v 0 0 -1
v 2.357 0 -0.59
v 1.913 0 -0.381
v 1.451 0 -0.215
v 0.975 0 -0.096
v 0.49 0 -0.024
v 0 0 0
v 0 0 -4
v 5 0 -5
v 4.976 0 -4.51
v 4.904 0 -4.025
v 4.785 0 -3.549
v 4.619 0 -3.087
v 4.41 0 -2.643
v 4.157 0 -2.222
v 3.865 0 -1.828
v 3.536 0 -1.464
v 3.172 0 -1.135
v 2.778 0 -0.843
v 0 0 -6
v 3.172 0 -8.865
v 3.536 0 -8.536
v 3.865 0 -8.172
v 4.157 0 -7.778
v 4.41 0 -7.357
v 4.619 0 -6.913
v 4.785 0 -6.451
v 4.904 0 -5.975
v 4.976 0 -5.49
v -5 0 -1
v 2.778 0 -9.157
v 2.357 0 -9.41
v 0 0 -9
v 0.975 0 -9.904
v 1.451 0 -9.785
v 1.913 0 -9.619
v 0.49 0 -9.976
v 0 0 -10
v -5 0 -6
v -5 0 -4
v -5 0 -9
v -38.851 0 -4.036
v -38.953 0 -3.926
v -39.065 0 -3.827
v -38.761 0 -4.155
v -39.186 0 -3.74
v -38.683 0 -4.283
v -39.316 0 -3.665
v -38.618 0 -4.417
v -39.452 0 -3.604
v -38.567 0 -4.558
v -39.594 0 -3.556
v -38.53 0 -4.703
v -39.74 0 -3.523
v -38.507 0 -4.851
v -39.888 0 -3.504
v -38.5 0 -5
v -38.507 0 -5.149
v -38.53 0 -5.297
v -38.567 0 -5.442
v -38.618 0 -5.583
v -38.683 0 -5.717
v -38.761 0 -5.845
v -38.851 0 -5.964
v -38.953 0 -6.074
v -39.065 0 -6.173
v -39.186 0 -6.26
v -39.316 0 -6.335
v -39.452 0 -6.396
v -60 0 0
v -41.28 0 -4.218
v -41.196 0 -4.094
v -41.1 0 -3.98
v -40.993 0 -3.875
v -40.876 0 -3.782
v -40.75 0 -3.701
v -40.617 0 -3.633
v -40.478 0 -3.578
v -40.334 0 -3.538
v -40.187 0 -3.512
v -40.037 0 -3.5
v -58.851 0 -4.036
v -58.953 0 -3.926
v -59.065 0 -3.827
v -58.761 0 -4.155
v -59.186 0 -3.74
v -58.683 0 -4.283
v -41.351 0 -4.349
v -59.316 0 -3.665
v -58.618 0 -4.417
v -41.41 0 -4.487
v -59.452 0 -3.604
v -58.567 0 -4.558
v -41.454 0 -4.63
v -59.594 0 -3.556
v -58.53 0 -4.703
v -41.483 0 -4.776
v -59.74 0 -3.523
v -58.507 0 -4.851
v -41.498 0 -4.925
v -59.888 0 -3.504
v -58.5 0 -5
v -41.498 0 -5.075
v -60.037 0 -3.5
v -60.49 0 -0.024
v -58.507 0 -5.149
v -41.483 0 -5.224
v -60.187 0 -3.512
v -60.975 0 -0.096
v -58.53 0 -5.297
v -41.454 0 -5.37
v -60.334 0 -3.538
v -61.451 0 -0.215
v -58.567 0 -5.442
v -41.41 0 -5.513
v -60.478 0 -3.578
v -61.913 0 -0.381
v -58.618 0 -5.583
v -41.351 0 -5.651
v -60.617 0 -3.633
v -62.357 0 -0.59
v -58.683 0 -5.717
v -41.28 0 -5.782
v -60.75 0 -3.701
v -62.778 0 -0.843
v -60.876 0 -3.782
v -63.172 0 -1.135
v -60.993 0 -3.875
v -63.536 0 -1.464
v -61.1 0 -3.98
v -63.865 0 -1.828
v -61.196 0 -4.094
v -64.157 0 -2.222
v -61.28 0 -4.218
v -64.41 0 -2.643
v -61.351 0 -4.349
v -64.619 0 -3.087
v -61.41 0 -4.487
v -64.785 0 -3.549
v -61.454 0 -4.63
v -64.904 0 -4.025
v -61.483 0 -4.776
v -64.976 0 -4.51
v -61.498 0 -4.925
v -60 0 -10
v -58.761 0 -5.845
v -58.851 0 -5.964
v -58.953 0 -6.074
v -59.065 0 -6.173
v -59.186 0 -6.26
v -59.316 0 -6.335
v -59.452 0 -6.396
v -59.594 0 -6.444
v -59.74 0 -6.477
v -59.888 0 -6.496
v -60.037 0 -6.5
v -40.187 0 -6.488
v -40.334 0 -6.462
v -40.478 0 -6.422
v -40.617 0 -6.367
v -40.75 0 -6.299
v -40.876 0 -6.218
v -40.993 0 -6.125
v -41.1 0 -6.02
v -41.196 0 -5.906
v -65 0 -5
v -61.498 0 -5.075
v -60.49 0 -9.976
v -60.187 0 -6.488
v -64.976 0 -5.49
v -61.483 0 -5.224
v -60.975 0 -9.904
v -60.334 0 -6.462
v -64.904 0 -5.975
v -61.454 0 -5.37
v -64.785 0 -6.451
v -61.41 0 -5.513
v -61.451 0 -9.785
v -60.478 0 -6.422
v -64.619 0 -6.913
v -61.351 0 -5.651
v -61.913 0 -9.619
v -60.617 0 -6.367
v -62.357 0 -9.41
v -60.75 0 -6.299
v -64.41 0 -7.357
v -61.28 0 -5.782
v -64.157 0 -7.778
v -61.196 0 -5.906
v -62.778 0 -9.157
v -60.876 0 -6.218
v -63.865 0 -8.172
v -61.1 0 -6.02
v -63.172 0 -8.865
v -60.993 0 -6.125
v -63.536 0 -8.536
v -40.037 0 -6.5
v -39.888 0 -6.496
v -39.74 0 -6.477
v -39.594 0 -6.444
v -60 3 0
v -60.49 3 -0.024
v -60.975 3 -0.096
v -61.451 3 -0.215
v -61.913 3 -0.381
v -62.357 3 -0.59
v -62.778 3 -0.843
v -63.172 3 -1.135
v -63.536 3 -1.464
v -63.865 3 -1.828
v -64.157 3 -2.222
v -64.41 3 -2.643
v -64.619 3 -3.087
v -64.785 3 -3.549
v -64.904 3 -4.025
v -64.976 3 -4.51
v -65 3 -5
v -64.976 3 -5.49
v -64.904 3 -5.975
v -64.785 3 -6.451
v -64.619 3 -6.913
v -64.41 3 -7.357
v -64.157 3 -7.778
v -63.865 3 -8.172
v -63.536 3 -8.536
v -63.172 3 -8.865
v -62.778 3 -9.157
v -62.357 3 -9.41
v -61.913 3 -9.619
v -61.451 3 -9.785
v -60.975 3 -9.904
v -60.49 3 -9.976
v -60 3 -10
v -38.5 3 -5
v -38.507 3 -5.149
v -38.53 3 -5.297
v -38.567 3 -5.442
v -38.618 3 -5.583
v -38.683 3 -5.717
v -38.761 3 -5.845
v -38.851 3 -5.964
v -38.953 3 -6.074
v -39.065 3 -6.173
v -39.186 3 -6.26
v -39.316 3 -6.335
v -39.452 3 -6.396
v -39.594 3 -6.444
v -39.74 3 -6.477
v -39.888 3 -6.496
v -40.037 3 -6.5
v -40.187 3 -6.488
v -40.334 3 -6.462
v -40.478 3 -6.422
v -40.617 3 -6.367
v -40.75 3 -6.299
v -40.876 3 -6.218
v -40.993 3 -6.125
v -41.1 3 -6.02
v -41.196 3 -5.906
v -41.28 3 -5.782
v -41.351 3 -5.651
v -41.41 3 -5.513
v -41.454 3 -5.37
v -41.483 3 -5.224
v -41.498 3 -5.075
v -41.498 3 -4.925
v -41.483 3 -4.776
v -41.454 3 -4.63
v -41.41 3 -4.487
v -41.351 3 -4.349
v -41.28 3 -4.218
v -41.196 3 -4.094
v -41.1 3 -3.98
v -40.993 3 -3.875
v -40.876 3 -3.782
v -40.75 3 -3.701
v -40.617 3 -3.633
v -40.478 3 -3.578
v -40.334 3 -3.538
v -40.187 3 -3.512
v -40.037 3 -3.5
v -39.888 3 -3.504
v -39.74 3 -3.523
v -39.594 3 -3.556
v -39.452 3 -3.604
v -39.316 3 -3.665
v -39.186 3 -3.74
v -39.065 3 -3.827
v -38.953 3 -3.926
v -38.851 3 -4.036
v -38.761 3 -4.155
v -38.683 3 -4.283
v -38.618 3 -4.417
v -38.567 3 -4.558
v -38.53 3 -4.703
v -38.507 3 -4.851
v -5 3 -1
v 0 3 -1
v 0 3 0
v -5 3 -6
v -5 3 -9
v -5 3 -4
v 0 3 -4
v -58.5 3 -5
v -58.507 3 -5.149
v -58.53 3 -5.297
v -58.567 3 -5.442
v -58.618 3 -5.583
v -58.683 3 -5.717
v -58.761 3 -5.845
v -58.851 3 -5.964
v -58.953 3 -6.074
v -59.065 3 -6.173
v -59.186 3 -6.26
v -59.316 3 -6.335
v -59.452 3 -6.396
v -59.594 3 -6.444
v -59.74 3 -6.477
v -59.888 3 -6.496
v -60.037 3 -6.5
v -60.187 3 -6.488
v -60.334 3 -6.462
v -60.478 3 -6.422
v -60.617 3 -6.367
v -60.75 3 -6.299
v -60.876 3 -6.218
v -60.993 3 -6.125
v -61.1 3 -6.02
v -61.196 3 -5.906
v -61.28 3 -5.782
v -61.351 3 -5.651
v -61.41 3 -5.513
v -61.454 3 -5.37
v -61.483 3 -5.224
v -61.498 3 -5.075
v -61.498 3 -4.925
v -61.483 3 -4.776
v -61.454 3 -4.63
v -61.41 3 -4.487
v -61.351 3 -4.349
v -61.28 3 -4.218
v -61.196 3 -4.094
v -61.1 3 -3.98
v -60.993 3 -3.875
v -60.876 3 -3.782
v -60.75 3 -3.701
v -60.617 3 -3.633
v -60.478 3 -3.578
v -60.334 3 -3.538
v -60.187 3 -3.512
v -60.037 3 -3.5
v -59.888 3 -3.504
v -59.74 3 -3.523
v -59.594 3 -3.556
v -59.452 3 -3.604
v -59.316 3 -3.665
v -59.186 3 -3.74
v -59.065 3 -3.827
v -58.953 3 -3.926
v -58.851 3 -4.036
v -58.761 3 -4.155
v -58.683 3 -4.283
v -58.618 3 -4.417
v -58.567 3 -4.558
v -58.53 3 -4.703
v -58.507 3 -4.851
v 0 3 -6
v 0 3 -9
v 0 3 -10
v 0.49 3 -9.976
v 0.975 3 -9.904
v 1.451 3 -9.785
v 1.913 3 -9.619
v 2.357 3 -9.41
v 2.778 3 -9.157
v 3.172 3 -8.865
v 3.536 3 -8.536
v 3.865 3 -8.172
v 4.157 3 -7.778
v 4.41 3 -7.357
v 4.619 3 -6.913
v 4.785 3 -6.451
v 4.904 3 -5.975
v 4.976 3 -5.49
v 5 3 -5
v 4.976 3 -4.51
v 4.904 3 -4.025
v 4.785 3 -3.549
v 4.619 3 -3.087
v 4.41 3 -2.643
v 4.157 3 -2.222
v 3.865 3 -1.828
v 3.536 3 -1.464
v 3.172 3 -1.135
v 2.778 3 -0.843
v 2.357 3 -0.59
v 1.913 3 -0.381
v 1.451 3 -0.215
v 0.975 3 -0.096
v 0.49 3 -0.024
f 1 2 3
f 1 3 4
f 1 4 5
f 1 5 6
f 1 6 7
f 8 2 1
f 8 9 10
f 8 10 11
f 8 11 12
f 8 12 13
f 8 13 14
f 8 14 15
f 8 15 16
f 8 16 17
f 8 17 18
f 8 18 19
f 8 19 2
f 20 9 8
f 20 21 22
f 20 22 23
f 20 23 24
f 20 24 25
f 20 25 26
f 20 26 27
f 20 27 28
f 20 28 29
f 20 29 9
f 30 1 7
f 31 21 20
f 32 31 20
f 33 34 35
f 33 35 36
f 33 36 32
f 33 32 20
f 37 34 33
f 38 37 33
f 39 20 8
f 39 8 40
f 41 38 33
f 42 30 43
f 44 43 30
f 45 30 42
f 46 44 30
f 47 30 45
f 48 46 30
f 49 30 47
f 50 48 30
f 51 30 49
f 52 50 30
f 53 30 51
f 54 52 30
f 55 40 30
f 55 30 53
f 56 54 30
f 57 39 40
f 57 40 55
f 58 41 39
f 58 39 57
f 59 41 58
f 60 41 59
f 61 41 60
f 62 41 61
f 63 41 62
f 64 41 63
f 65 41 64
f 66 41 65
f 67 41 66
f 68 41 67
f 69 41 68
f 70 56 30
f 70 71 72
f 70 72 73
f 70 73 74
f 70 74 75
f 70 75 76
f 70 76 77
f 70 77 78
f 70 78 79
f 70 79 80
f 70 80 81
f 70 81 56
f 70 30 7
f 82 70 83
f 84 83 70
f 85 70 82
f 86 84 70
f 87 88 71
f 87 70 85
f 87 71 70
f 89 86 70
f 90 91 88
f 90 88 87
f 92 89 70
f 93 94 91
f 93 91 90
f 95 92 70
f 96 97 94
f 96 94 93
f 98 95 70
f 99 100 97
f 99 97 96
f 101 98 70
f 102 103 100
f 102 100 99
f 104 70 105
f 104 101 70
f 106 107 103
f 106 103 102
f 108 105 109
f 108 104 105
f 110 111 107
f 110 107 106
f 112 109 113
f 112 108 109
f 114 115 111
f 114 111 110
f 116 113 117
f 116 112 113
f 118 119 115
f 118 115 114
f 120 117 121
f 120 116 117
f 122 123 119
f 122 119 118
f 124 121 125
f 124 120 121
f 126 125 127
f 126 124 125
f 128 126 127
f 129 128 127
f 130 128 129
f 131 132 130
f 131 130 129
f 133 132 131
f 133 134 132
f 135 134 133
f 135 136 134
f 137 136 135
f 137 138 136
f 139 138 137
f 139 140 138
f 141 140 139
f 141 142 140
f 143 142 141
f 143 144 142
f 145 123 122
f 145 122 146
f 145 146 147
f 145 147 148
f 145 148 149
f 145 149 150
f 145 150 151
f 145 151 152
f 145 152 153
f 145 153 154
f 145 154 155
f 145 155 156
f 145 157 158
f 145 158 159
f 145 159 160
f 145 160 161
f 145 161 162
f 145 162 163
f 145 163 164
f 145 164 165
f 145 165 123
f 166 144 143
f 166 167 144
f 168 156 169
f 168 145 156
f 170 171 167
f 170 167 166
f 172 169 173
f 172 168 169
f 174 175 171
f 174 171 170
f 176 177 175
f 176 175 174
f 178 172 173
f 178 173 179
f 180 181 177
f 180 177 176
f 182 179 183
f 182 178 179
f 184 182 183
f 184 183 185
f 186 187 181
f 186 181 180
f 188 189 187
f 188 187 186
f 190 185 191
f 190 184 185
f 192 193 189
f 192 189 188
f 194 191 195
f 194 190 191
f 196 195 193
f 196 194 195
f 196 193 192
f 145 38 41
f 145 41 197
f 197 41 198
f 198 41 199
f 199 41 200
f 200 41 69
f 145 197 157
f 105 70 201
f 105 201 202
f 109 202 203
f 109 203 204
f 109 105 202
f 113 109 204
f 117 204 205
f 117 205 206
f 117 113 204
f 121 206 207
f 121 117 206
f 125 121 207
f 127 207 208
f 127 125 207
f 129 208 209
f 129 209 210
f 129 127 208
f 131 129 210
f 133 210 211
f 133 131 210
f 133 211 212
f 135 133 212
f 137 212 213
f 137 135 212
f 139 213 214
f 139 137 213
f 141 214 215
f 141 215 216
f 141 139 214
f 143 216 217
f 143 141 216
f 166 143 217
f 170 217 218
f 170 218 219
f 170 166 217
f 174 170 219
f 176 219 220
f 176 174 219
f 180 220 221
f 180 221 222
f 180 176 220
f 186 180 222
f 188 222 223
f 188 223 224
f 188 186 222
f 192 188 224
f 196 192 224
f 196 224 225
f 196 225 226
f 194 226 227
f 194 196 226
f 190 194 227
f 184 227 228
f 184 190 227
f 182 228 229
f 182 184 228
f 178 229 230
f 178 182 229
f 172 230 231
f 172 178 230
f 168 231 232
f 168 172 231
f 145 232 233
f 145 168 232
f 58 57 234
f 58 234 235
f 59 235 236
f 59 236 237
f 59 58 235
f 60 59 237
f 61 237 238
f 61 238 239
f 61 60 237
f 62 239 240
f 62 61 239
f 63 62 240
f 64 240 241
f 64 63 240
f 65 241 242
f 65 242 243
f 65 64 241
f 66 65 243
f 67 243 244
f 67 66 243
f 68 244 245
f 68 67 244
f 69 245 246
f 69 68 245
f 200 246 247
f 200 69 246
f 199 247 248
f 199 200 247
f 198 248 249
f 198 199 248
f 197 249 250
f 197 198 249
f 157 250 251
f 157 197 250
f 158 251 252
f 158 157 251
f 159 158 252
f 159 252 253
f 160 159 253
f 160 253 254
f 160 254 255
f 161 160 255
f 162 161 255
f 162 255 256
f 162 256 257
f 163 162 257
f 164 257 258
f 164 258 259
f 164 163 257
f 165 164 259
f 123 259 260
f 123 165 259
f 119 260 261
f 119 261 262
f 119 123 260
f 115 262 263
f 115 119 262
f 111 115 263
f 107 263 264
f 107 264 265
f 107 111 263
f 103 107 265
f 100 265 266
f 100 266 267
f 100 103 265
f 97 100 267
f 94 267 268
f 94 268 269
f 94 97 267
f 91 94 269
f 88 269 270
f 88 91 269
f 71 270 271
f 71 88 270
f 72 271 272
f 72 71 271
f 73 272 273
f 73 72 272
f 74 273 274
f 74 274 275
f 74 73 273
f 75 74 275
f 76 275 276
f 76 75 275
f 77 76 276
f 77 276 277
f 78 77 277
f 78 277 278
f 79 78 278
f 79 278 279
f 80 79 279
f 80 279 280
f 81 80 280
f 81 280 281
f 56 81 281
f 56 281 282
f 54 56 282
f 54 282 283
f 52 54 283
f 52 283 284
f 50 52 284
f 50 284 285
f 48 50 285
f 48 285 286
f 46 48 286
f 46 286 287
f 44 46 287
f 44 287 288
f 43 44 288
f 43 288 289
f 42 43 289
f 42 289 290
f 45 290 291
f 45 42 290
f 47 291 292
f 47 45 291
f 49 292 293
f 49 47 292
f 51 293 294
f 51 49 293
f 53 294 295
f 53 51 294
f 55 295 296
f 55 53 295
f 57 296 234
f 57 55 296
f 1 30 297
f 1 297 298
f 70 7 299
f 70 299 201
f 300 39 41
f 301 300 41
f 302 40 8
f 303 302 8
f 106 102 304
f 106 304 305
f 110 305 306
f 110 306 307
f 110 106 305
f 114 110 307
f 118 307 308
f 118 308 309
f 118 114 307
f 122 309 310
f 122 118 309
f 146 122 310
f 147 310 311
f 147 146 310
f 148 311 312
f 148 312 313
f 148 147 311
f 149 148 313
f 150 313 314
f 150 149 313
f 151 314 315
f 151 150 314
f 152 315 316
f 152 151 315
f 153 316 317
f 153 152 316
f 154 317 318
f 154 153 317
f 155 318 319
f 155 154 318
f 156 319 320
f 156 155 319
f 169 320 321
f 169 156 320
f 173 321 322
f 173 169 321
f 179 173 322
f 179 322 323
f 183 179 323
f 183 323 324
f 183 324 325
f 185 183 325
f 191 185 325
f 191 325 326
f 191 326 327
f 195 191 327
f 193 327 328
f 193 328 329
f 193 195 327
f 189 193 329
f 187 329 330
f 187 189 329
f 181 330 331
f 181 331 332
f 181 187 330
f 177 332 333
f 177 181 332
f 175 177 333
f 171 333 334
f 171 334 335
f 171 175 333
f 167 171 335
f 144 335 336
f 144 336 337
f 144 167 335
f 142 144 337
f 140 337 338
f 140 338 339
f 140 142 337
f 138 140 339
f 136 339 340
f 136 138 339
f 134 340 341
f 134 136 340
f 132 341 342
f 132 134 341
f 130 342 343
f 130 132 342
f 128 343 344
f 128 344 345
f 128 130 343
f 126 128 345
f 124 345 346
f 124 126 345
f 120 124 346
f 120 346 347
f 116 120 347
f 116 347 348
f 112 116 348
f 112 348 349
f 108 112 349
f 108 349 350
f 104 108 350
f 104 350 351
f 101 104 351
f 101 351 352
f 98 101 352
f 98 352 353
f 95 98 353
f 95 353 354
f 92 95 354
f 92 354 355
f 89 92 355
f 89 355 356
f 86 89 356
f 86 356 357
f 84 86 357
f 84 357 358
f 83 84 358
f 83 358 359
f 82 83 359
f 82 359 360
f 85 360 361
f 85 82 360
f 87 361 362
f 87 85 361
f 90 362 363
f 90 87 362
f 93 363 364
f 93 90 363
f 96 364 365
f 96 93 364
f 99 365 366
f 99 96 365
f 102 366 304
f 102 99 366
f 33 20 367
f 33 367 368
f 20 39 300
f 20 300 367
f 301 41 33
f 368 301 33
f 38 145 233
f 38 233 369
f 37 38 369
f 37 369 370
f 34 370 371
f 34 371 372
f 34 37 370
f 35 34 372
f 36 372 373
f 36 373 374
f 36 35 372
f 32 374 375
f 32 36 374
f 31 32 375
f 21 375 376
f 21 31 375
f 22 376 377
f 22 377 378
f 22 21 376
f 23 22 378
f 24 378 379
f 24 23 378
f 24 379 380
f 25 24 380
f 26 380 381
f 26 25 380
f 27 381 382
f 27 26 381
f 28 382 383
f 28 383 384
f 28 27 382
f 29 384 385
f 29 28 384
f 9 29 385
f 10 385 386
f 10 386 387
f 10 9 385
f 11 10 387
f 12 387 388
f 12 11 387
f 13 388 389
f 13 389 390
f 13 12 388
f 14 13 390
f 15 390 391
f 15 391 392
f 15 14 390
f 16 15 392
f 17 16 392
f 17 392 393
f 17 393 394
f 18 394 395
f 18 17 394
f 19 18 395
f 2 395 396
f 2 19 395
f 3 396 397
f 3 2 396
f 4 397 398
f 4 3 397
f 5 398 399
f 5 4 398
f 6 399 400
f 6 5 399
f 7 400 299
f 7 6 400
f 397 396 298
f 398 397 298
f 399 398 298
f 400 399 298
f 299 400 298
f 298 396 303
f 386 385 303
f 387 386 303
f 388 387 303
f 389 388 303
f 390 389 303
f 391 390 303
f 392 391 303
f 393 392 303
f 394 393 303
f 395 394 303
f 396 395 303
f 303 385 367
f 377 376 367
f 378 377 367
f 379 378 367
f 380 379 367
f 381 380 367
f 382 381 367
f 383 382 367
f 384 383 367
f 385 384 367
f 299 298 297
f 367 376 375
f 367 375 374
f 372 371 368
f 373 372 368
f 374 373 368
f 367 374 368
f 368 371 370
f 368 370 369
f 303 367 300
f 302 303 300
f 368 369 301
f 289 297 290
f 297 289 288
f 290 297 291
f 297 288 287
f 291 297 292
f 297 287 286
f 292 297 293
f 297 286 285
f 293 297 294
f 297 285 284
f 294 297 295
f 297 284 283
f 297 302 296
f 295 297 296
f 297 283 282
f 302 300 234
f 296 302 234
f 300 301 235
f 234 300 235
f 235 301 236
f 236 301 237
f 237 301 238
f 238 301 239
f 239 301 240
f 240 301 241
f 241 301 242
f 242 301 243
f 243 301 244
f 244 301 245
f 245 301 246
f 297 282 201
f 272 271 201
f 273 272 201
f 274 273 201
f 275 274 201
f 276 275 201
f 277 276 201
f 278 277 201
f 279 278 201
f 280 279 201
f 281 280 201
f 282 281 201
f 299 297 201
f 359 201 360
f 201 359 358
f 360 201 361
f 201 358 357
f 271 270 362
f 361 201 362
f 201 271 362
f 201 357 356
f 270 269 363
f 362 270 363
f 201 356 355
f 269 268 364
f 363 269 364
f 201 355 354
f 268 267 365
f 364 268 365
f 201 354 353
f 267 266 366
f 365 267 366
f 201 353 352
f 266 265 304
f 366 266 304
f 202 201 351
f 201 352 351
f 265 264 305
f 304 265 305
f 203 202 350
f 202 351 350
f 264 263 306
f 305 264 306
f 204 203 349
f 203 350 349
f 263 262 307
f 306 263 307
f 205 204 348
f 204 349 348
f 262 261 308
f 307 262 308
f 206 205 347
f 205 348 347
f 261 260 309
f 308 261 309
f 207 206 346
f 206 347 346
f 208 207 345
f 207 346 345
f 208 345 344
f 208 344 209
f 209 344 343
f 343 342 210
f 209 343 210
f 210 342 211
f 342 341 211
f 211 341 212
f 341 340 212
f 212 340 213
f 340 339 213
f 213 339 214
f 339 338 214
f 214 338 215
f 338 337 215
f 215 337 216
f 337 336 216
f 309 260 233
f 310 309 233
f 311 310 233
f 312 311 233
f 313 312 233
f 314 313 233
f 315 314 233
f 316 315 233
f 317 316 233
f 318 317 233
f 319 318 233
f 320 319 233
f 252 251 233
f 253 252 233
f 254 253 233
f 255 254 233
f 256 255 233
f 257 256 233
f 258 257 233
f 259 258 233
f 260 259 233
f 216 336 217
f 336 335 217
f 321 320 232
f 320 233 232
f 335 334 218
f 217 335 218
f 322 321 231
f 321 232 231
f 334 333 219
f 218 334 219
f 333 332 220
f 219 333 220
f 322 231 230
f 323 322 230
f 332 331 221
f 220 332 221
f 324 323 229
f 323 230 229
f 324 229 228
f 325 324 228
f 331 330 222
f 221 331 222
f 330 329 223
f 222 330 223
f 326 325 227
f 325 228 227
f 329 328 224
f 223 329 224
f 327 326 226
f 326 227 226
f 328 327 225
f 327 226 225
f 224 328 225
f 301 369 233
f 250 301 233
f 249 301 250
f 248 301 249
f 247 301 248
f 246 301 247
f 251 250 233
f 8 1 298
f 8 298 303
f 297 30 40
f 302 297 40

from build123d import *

# Parameters (mm, degrees)
SKETCH1_R           = 1.5
SKETCH1_W           = 5
SKETCH1_H           = 3
BOSS_EXTRUDE1_DEPTH = 3


with BuildPart() as part:
    # Sketch1 → Boss-Extrude1 (new body)
    with BuildSketch(Plane(origin=(0, 0, 0), x_dir=(1, 0, 0), z_dir=(0, 1, 0))):
        with BuildLine():
            Line((0, 0), (-60, 0))
            ThreePointArc((-60, 0), (-65, 5), (-60, 10))
            Line((-60, 10), (0, 10))
            ThreePointArc((0, 10), (5, 5), (0, 0))
        make_face()
        with Locations((-60, 5)):
            Circle(SKETCH1_R, mode=Mode.SUBTRACT)
        with Locations((-40, 5)):
            Circle(SKETCH1_R, mode=Mode.SUBTRACT)
        with Locations((-2.5, 2.5)):
            Rectangle(SKETCH1_W, SKETCH1_H, mode=Mode.SUBTRACT)
        with Locations((-2.5, 7.5)):
            Rectangle(SKETCH1_W, SKETCH1_H, mode=Mode.SUBTRACT)
    extrude(amount=BOSS_EXTRUDE1_DEPTH)


solid = part.part
